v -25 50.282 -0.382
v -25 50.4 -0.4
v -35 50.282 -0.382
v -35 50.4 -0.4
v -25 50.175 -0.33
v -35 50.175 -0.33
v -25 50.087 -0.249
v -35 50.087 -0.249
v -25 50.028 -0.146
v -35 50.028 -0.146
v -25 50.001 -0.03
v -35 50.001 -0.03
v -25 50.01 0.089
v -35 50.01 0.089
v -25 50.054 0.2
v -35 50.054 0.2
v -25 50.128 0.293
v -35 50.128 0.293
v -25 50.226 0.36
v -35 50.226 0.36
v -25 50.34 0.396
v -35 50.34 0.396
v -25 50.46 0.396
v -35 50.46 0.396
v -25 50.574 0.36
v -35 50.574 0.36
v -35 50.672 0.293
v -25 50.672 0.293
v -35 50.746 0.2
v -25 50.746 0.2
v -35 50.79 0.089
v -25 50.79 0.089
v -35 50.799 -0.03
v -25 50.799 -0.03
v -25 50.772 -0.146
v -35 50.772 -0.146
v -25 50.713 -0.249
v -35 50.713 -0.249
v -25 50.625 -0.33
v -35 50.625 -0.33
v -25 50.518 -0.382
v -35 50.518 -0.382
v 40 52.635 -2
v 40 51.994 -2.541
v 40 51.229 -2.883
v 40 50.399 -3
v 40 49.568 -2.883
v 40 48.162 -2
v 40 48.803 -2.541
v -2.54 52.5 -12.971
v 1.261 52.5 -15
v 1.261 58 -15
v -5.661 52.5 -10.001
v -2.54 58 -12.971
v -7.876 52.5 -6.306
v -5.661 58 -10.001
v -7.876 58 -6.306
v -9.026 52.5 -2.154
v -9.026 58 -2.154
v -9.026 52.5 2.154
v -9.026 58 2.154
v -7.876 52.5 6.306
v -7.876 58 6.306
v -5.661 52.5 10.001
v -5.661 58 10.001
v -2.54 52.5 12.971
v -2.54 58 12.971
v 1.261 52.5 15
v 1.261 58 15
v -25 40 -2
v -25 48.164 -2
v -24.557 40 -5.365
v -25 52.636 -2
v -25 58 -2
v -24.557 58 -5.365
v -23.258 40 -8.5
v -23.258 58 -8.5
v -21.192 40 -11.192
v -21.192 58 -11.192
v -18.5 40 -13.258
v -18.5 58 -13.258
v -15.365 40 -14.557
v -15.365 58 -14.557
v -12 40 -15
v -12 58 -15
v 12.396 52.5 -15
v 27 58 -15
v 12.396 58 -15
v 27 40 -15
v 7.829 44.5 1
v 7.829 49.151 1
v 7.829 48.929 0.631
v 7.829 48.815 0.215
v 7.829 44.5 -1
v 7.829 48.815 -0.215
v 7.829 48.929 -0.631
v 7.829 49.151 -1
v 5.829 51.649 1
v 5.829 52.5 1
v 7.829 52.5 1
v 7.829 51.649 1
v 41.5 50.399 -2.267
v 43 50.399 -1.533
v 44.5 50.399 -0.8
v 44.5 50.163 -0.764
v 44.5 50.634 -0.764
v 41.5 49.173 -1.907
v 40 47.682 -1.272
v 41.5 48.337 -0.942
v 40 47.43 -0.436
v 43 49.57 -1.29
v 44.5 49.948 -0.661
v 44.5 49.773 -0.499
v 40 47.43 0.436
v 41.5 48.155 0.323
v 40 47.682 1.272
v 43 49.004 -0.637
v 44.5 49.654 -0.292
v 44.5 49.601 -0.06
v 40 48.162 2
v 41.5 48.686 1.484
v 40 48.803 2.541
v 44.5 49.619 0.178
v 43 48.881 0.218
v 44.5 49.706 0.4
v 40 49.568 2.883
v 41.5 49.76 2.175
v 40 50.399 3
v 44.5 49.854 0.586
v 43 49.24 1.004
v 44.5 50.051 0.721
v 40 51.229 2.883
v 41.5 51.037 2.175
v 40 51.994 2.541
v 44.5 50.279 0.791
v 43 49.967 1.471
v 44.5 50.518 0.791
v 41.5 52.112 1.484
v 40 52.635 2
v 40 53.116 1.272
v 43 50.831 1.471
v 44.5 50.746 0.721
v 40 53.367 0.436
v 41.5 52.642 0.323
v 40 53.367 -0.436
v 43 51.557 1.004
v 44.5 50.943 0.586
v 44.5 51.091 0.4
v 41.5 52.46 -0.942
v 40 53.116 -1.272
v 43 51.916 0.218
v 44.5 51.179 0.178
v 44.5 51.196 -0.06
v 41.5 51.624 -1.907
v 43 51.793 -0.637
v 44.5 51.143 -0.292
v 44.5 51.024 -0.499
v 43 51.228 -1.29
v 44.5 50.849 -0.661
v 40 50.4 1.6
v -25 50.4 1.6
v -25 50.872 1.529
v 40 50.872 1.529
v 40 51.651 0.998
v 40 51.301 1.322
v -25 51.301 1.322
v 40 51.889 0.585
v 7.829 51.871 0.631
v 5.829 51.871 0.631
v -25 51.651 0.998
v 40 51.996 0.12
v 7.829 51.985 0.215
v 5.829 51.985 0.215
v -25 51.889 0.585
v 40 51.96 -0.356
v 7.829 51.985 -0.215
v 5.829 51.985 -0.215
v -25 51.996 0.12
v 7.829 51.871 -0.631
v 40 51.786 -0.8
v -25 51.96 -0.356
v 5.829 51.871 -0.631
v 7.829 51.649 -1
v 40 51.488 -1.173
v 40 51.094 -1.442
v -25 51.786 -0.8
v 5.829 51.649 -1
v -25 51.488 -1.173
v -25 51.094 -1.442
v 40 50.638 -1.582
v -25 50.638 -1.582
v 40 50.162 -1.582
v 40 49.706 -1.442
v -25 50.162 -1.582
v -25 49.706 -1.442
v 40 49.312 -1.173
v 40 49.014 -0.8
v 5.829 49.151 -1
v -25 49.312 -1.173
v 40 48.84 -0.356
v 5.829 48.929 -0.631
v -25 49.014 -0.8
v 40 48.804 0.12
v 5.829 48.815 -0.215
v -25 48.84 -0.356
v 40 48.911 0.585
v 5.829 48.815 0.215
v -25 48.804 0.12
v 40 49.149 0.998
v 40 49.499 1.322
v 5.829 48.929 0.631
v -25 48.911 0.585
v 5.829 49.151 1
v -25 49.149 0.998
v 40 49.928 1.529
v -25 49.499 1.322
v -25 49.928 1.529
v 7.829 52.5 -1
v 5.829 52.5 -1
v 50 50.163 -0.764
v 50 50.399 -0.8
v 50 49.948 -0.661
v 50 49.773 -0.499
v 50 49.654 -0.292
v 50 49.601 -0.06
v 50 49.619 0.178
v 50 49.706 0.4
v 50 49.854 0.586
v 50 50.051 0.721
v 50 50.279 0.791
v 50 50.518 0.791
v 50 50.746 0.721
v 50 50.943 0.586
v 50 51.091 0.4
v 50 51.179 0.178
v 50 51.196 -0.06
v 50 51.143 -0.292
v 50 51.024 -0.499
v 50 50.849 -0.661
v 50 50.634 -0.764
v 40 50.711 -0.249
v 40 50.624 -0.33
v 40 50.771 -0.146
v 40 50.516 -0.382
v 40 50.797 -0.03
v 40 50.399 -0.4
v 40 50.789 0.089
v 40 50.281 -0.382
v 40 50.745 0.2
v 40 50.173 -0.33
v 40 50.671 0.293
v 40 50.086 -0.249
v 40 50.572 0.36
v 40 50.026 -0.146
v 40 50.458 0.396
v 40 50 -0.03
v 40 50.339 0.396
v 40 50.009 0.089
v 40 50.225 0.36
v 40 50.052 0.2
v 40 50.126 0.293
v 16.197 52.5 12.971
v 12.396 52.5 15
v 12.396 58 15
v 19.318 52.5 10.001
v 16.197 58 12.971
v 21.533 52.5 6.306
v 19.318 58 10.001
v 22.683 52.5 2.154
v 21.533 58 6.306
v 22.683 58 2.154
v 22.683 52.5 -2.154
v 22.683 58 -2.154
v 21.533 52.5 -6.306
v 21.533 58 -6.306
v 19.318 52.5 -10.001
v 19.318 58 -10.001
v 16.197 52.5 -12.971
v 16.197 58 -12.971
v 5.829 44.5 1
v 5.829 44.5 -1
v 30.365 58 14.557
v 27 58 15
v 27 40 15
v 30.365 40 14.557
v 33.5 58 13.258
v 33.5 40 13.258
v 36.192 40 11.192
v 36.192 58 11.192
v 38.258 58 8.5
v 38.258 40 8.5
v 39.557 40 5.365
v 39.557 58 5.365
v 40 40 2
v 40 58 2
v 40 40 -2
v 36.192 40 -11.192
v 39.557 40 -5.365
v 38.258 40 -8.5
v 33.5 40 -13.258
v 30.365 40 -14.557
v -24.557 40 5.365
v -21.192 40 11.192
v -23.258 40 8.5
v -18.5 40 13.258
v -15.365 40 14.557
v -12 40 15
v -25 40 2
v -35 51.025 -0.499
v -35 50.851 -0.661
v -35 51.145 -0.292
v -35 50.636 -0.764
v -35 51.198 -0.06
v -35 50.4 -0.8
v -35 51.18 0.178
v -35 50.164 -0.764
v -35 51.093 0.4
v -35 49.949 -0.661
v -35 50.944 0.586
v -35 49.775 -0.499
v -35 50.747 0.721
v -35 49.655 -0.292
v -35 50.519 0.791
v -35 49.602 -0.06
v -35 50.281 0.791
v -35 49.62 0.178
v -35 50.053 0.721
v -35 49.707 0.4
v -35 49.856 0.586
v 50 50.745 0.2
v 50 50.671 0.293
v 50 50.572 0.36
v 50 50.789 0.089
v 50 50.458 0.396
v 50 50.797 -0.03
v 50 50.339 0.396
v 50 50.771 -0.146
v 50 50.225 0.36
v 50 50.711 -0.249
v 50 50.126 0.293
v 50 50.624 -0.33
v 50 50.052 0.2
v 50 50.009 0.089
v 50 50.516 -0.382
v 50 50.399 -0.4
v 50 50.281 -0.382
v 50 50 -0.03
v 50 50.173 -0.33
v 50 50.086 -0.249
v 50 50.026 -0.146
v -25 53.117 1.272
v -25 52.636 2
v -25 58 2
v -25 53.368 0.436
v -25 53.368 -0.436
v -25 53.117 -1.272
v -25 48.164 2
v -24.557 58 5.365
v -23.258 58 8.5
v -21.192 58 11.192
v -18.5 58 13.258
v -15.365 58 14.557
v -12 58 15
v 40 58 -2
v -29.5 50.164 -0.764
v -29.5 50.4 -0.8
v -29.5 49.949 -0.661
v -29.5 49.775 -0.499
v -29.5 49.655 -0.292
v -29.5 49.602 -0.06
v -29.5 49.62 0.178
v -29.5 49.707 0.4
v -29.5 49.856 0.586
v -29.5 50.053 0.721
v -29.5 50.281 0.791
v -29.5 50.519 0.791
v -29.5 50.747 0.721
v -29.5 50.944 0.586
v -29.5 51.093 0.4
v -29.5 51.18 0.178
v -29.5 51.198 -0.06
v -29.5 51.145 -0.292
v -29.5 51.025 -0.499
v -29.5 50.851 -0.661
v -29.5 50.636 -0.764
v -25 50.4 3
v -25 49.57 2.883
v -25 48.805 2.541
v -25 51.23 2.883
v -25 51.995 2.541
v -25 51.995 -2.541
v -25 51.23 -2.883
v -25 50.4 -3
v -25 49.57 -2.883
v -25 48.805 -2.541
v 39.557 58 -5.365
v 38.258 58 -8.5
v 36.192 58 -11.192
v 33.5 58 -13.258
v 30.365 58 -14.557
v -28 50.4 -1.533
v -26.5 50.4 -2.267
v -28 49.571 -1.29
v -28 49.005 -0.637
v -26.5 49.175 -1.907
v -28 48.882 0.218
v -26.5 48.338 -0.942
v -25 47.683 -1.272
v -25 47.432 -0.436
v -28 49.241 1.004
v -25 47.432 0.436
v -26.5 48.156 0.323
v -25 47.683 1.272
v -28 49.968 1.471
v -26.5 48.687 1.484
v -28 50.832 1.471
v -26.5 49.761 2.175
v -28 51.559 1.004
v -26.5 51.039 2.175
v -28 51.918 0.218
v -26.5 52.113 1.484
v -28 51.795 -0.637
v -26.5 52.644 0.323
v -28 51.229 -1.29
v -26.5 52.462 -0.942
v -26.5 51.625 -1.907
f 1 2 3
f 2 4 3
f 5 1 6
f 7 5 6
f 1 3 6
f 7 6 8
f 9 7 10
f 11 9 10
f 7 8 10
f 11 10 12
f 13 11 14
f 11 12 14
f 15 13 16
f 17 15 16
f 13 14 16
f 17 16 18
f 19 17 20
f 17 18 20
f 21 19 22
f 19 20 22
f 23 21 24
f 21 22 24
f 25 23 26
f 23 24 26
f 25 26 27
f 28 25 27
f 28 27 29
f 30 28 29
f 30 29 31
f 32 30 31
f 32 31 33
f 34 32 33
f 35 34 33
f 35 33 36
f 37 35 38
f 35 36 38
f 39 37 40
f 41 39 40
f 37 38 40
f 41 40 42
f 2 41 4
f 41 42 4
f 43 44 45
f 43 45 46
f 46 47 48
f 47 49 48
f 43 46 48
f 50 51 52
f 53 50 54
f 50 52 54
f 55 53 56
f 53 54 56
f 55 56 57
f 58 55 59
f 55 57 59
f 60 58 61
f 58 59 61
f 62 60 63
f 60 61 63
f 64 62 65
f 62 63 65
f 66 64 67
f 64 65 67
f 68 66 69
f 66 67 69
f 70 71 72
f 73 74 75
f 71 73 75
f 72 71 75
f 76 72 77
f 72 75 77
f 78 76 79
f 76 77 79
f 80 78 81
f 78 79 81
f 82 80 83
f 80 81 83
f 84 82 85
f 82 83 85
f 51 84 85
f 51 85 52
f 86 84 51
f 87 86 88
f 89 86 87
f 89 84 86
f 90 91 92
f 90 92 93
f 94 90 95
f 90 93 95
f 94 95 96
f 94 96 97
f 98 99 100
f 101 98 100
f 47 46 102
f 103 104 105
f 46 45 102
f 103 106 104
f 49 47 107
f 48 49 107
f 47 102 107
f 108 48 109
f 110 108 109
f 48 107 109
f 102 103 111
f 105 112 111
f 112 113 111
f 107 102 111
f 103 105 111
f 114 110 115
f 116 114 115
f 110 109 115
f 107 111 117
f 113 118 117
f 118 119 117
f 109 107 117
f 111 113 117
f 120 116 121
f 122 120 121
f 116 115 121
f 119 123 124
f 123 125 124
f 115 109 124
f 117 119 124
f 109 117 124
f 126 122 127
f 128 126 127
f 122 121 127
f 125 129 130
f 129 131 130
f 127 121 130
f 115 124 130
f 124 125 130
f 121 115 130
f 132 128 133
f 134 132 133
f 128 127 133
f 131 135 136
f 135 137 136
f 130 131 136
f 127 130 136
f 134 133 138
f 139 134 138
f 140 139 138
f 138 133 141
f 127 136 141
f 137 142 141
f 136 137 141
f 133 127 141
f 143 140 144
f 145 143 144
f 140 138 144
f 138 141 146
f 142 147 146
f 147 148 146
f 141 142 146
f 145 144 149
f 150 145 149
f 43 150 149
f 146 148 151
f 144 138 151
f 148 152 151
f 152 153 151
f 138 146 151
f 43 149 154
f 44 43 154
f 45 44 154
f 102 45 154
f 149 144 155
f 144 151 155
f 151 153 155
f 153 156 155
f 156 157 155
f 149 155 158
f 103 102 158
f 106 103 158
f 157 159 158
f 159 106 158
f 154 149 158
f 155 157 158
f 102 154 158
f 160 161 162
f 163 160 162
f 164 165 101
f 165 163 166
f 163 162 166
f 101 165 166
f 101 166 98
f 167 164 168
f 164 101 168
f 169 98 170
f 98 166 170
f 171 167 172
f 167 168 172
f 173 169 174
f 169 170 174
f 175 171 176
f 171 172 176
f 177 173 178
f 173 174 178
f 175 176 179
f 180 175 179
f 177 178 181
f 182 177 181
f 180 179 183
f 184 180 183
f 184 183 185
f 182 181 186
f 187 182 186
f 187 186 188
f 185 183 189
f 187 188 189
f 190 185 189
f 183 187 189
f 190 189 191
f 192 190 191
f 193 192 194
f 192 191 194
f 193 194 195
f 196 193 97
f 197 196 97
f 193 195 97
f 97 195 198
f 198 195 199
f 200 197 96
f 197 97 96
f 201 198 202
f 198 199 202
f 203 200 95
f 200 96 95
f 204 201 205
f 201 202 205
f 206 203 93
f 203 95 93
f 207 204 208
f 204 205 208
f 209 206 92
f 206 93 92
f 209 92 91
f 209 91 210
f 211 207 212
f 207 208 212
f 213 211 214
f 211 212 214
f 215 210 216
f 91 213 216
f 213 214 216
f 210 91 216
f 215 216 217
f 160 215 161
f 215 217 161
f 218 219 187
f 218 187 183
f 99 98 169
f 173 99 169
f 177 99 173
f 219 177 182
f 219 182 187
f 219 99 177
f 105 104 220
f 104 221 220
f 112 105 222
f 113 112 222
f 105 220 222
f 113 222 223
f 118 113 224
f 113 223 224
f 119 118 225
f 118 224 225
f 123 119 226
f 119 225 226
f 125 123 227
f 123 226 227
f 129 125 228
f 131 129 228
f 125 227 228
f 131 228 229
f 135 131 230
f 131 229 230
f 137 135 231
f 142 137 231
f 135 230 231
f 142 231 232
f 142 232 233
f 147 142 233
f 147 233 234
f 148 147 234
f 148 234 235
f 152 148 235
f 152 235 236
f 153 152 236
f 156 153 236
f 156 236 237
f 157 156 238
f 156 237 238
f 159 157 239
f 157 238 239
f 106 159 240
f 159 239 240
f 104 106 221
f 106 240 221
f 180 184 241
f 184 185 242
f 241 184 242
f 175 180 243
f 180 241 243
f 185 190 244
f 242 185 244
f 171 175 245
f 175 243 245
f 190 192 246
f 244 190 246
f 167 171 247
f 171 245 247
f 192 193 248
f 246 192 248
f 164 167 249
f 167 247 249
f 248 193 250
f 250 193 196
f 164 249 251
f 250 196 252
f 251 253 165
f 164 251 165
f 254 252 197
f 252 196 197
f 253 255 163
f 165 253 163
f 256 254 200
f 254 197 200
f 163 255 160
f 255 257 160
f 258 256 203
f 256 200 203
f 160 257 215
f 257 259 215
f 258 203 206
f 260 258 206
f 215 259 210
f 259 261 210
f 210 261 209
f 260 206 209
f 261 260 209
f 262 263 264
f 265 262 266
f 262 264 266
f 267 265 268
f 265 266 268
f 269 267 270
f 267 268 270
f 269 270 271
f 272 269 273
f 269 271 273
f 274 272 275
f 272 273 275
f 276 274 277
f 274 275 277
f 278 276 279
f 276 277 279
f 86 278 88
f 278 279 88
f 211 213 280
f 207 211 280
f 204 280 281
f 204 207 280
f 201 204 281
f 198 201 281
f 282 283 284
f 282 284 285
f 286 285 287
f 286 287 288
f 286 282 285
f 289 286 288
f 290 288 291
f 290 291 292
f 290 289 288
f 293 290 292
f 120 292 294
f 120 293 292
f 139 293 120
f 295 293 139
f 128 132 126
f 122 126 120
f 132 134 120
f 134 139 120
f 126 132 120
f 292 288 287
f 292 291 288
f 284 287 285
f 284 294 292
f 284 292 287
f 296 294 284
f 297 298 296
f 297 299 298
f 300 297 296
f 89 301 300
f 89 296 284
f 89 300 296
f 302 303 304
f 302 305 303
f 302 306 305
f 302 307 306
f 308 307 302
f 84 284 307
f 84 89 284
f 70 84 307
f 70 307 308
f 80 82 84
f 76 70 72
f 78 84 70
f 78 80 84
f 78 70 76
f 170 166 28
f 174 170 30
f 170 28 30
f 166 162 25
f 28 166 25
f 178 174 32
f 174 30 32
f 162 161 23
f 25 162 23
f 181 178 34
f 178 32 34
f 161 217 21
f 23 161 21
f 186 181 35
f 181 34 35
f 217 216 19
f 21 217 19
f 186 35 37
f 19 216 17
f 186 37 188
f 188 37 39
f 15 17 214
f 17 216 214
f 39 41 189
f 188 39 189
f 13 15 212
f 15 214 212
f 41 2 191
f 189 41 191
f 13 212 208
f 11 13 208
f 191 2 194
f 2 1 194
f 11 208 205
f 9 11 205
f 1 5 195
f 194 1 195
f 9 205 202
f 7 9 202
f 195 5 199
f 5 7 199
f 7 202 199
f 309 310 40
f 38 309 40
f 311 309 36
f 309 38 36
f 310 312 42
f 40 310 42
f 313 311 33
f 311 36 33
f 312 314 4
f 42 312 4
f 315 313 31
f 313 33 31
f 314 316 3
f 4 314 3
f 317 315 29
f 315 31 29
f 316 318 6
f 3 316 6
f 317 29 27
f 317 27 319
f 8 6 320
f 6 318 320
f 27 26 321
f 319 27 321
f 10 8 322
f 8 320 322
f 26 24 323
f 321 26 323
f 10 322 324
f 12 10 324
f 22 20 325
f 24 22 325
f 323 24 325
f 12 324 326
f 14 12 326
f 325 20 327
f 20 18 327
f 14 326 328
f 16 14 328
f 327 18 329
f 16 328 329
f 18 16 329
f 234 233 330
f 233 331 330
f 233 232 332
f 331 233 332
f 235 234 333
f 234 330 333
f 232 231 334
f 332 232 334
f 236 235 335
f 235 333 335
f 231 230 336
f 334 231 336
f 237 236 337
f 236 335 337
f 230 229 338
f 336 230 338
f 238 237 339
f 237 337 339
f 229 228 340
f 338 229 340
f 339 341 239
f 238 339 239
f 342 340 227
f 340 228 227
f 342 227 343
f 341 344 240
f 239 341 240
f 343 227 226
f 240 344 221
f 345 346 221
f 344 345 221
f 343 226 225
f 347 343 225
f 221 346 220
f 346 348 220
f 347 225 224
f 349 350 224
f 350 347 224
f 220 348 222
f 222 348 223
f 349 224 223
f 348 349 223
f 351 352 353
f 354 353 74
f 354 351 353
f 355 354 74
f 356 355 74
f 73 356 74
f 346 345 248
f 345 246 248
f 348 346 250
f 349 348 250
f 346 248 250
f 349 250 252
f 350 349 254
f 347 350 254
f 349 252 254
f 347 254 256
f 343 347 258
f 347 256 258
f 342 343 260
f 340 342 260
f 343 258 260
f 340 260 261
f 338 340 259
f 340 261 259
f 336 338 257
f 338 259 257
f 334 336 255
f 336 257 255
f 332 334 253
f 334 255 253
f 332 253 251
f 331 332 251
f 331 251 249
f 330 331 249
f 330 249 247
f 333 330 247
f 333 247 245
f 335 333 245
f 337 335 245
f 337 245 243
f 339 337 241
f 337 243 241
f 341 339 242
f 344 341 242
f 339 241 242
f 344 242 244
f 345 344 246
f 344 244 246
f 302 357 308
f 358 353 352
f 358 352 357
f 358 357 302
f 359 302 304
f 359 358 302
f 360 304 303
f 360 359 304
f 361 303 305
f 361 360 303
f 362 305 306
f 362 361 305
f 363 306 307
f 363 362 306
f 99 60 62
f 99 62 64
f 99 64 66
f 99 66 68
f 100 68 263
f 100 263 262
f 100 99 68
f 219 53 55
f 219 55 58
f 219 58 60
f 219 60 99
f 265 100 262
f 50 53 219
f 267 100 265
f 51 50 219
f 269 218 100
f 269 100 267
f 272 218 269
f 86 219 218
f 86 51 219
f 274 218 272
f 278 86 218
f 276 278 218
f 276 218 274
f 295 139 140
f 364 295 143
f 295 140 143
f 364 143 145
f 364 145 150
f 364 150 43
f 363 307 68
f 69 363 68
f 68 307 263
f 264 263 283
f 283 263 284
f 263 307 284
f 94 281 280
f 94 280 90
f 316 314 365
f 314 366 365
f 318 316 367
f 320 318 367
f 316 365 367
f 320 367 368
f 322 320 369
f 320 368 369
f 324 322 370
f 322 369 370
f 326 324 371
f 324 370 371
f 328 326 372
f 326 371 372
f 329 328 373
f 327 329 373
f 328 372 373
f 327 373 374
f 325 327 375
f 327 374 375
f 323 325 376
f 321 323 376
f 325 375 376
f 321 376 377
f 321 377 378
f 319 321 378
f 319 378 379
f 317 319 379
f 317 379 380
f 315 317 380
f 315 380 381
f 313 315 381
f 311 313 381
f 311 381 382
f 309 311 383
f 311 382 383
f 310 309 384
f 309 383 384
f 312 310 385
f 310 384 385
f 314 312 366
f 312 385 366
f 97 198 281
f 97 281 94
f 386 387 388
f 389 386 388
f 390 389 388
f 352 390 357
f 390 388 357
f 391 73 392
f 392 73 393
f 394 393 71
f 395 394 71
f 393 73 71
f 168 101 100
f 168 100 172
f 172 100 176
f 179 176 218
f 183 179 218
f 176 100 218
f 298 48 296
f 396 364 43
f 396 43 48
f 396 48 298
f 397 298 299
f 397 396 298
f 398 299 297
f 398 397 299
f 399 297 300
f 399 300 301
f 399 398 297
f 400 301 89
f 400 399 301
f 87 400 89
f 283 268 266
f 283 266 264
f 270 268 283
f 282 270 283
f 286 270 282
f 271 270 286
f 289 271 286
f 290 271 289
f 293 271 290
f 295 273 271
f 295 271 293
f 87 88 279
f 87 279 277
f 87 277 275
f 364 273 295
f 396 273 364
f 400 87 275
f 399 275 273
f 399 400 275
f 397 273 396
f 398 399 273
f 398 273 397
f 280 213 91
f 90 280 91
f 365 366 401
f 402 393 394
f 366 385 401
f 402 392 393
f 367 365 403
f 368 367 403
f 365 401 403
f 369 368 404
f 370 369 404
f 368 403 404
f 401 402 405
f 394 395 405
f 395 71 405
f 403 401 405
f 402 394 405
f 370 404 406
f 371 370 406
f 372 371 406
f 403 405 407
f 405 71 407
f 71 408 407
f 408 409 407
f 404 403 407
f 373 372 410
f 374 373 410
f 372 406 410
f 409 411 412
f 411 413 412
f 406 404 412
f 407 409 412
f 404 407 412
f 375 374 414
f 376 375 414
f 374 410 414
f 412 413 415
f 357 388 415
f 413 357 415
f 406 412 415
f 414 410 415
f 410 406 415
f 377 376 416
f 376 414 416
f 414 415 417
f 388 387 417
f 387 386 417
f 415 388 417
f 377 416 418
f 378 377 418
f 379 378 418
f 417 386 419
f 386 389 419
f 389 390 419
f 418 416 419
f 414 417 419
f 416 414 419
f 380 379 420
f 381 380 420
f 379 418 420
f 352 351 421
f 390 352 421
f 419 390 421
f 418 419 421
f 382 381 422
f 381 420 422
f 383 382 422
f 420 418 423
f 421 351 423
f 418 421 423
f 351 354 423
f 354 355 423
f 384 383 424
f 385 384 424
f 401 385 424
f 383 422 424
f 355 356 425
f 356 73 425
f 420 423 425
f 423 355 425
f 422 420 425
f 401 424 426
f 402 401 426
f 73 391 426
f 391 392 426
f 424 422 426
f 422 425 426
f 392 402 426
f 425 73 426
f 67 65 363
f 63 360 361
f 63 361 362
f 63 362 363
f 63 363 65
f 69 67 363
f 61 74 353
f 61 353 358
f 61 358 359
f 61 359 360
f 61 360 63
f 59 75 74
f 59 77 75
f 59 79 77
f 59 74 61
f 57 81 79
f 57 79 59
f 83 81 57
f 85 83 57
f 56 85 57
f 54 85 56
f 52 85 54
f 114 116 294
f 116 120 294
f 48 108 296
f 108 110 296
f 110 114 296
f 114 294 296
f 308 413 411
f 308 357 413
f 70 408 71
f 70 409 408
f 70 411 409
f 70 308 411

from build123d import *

# Parameters (mm, degrees)
SKETCH1_W           = 65
SKETCH1_H           = 30
BOSS_EXTRUDE1_DEPTH = 58
FILLET1_R           = 13
SKETCH15_W          = 83.696095513
SKETCH15_H          = 31.69844841
CUT_EXTRUDE7_DEPTH  = 50
SKETCH18_R          = 16
CUT_EXTRUDE10_DEPTH = 5.5
CUT_EXTRUDE12_REACH = 90.397
SKETCH3_R           = 1.6
SKETCH21_W          = 2
SKETCH21_H          = 2
CUT_EXTRUDE13_DEPTH = 8


with BuildPart() as part:
    # Sketch1 → Boss-Extrude1 (new body)
    with BuildSketch(Plane(origin=(0, 0, 0), x_dir=(1, 0, 0), z_dir=(0, 1, 0))):
        with Locations((7.5, 0)):
            Rectangle(SKETCH1_W, SKETCH1_H)
    extrude(amount=BOSS_EXTRUDE1_DEPTH)

    # Fillet1
    fillet1_edges = [part.edges().sort_by_distance(p)[0] for p in [
        (40, 29, 15),
        (-25, 29, 15),
        (-25, 29, -15),
        (40, 29, -15),
    ]]
    fillet(fillet1_edges, radius=FILLET1_R)

    # Sketch15 → Cut-Extrude7 (cut)
    with BuildSketch(Plane(origin=(0, -10, 0), x_dir=(-1, 0, 0), z_dir=(0, -1, 0))):
        with Locations((-0.057440767, 0.030479277)):
            Rectangle(SKETCH15_W, SKETCH15_H)
    extrude(amount=-CUT_EXTRUDE7_DEPTH, mode=Mode.SUBTRACT)

    # Sketch18 → Cut-Extrude10 (cut)
    with BuildSketch(Plane(origin=(0, 58, 0), x_dir=(1, 0, 0), z_dir=(0, 1, 0))):
        with Locations((6.828508286, 0)):
            Circle(SKETCH18_R)
    extrude(amount=-CUT_EXTRUDE10_DEPTH, mode=Mode.SUBTRACT)

    # Sketch3 → Cut-Extrude12 (cut, up to next)
    with BuildSketch(Plane.ZY.offset(25), mode=Mode.PRIVATE) as cut_extrude12_sk1:
        with Locations((0, 50.4)):
            Circle(SKETCH3_R)
    cut_extrude12_tool1 = extrude(cut_extrude12_sk1.sketch, amount=-CUT_EXTRUDE12_REACH, mode=Mode.PRIVATE) & part.part
    add(cut_extrude12_tool1.solids().sort_by_distance((-25, 50.4, 0))[0], mode=Mode.SUBTRACT)

    # Sketch21 → Cut-Extrude13 (cut)
    with BuildSketch(Plane(origin=(0, 52.5, 0), x_dir=(1, 0, 0), z_dir=(0, 1, 0))):
        with Locations((6.828508286, 0)):
            Rectangle(SKETCH21_W, SKETCH21_H)
    extrude(amount=-CUT_EXTRUDE13_DEPTH, mode=Mode.SUBTRACT)

    # Sketch24 → Revolve1 (revolve)
    with BuildSketch(Plane.XY, mode=Mode.PRIVATE) as revolve1_sk:
        Polygon((-25, 50.8), (-35, 50.8), (-35, 51.2), (-29.5, 51.2), (-25, 53.4), align=None)
    revolve(revolve1_sk.sketch.rotate(Axis((-25, 50.4, 0), (-1, 0, 0)), 90), axis=Axis((-25, 50.4, 0), (-1, 0, 0)))

    # Sketch25 → Revolve2 (revolve)
    with BuildSketch(Plane.XY, mode=Mode.PRIVATE) as revolve2_sk:
        Polygon((40, 50.79856611), (40, 53.39856611), (44.5, 51.19856611), (50, 51.19856611), (50, 50.79856611), align=None)
    revolve(revolve2_sk.sketch.rotate(Axis((50.482197819, 50.39856611, 0), (-1, 0, 0)), 90), axis=Axis((50.482197819, 50.39856611, 0), (-1, 0, 0)))


solid = part.part
